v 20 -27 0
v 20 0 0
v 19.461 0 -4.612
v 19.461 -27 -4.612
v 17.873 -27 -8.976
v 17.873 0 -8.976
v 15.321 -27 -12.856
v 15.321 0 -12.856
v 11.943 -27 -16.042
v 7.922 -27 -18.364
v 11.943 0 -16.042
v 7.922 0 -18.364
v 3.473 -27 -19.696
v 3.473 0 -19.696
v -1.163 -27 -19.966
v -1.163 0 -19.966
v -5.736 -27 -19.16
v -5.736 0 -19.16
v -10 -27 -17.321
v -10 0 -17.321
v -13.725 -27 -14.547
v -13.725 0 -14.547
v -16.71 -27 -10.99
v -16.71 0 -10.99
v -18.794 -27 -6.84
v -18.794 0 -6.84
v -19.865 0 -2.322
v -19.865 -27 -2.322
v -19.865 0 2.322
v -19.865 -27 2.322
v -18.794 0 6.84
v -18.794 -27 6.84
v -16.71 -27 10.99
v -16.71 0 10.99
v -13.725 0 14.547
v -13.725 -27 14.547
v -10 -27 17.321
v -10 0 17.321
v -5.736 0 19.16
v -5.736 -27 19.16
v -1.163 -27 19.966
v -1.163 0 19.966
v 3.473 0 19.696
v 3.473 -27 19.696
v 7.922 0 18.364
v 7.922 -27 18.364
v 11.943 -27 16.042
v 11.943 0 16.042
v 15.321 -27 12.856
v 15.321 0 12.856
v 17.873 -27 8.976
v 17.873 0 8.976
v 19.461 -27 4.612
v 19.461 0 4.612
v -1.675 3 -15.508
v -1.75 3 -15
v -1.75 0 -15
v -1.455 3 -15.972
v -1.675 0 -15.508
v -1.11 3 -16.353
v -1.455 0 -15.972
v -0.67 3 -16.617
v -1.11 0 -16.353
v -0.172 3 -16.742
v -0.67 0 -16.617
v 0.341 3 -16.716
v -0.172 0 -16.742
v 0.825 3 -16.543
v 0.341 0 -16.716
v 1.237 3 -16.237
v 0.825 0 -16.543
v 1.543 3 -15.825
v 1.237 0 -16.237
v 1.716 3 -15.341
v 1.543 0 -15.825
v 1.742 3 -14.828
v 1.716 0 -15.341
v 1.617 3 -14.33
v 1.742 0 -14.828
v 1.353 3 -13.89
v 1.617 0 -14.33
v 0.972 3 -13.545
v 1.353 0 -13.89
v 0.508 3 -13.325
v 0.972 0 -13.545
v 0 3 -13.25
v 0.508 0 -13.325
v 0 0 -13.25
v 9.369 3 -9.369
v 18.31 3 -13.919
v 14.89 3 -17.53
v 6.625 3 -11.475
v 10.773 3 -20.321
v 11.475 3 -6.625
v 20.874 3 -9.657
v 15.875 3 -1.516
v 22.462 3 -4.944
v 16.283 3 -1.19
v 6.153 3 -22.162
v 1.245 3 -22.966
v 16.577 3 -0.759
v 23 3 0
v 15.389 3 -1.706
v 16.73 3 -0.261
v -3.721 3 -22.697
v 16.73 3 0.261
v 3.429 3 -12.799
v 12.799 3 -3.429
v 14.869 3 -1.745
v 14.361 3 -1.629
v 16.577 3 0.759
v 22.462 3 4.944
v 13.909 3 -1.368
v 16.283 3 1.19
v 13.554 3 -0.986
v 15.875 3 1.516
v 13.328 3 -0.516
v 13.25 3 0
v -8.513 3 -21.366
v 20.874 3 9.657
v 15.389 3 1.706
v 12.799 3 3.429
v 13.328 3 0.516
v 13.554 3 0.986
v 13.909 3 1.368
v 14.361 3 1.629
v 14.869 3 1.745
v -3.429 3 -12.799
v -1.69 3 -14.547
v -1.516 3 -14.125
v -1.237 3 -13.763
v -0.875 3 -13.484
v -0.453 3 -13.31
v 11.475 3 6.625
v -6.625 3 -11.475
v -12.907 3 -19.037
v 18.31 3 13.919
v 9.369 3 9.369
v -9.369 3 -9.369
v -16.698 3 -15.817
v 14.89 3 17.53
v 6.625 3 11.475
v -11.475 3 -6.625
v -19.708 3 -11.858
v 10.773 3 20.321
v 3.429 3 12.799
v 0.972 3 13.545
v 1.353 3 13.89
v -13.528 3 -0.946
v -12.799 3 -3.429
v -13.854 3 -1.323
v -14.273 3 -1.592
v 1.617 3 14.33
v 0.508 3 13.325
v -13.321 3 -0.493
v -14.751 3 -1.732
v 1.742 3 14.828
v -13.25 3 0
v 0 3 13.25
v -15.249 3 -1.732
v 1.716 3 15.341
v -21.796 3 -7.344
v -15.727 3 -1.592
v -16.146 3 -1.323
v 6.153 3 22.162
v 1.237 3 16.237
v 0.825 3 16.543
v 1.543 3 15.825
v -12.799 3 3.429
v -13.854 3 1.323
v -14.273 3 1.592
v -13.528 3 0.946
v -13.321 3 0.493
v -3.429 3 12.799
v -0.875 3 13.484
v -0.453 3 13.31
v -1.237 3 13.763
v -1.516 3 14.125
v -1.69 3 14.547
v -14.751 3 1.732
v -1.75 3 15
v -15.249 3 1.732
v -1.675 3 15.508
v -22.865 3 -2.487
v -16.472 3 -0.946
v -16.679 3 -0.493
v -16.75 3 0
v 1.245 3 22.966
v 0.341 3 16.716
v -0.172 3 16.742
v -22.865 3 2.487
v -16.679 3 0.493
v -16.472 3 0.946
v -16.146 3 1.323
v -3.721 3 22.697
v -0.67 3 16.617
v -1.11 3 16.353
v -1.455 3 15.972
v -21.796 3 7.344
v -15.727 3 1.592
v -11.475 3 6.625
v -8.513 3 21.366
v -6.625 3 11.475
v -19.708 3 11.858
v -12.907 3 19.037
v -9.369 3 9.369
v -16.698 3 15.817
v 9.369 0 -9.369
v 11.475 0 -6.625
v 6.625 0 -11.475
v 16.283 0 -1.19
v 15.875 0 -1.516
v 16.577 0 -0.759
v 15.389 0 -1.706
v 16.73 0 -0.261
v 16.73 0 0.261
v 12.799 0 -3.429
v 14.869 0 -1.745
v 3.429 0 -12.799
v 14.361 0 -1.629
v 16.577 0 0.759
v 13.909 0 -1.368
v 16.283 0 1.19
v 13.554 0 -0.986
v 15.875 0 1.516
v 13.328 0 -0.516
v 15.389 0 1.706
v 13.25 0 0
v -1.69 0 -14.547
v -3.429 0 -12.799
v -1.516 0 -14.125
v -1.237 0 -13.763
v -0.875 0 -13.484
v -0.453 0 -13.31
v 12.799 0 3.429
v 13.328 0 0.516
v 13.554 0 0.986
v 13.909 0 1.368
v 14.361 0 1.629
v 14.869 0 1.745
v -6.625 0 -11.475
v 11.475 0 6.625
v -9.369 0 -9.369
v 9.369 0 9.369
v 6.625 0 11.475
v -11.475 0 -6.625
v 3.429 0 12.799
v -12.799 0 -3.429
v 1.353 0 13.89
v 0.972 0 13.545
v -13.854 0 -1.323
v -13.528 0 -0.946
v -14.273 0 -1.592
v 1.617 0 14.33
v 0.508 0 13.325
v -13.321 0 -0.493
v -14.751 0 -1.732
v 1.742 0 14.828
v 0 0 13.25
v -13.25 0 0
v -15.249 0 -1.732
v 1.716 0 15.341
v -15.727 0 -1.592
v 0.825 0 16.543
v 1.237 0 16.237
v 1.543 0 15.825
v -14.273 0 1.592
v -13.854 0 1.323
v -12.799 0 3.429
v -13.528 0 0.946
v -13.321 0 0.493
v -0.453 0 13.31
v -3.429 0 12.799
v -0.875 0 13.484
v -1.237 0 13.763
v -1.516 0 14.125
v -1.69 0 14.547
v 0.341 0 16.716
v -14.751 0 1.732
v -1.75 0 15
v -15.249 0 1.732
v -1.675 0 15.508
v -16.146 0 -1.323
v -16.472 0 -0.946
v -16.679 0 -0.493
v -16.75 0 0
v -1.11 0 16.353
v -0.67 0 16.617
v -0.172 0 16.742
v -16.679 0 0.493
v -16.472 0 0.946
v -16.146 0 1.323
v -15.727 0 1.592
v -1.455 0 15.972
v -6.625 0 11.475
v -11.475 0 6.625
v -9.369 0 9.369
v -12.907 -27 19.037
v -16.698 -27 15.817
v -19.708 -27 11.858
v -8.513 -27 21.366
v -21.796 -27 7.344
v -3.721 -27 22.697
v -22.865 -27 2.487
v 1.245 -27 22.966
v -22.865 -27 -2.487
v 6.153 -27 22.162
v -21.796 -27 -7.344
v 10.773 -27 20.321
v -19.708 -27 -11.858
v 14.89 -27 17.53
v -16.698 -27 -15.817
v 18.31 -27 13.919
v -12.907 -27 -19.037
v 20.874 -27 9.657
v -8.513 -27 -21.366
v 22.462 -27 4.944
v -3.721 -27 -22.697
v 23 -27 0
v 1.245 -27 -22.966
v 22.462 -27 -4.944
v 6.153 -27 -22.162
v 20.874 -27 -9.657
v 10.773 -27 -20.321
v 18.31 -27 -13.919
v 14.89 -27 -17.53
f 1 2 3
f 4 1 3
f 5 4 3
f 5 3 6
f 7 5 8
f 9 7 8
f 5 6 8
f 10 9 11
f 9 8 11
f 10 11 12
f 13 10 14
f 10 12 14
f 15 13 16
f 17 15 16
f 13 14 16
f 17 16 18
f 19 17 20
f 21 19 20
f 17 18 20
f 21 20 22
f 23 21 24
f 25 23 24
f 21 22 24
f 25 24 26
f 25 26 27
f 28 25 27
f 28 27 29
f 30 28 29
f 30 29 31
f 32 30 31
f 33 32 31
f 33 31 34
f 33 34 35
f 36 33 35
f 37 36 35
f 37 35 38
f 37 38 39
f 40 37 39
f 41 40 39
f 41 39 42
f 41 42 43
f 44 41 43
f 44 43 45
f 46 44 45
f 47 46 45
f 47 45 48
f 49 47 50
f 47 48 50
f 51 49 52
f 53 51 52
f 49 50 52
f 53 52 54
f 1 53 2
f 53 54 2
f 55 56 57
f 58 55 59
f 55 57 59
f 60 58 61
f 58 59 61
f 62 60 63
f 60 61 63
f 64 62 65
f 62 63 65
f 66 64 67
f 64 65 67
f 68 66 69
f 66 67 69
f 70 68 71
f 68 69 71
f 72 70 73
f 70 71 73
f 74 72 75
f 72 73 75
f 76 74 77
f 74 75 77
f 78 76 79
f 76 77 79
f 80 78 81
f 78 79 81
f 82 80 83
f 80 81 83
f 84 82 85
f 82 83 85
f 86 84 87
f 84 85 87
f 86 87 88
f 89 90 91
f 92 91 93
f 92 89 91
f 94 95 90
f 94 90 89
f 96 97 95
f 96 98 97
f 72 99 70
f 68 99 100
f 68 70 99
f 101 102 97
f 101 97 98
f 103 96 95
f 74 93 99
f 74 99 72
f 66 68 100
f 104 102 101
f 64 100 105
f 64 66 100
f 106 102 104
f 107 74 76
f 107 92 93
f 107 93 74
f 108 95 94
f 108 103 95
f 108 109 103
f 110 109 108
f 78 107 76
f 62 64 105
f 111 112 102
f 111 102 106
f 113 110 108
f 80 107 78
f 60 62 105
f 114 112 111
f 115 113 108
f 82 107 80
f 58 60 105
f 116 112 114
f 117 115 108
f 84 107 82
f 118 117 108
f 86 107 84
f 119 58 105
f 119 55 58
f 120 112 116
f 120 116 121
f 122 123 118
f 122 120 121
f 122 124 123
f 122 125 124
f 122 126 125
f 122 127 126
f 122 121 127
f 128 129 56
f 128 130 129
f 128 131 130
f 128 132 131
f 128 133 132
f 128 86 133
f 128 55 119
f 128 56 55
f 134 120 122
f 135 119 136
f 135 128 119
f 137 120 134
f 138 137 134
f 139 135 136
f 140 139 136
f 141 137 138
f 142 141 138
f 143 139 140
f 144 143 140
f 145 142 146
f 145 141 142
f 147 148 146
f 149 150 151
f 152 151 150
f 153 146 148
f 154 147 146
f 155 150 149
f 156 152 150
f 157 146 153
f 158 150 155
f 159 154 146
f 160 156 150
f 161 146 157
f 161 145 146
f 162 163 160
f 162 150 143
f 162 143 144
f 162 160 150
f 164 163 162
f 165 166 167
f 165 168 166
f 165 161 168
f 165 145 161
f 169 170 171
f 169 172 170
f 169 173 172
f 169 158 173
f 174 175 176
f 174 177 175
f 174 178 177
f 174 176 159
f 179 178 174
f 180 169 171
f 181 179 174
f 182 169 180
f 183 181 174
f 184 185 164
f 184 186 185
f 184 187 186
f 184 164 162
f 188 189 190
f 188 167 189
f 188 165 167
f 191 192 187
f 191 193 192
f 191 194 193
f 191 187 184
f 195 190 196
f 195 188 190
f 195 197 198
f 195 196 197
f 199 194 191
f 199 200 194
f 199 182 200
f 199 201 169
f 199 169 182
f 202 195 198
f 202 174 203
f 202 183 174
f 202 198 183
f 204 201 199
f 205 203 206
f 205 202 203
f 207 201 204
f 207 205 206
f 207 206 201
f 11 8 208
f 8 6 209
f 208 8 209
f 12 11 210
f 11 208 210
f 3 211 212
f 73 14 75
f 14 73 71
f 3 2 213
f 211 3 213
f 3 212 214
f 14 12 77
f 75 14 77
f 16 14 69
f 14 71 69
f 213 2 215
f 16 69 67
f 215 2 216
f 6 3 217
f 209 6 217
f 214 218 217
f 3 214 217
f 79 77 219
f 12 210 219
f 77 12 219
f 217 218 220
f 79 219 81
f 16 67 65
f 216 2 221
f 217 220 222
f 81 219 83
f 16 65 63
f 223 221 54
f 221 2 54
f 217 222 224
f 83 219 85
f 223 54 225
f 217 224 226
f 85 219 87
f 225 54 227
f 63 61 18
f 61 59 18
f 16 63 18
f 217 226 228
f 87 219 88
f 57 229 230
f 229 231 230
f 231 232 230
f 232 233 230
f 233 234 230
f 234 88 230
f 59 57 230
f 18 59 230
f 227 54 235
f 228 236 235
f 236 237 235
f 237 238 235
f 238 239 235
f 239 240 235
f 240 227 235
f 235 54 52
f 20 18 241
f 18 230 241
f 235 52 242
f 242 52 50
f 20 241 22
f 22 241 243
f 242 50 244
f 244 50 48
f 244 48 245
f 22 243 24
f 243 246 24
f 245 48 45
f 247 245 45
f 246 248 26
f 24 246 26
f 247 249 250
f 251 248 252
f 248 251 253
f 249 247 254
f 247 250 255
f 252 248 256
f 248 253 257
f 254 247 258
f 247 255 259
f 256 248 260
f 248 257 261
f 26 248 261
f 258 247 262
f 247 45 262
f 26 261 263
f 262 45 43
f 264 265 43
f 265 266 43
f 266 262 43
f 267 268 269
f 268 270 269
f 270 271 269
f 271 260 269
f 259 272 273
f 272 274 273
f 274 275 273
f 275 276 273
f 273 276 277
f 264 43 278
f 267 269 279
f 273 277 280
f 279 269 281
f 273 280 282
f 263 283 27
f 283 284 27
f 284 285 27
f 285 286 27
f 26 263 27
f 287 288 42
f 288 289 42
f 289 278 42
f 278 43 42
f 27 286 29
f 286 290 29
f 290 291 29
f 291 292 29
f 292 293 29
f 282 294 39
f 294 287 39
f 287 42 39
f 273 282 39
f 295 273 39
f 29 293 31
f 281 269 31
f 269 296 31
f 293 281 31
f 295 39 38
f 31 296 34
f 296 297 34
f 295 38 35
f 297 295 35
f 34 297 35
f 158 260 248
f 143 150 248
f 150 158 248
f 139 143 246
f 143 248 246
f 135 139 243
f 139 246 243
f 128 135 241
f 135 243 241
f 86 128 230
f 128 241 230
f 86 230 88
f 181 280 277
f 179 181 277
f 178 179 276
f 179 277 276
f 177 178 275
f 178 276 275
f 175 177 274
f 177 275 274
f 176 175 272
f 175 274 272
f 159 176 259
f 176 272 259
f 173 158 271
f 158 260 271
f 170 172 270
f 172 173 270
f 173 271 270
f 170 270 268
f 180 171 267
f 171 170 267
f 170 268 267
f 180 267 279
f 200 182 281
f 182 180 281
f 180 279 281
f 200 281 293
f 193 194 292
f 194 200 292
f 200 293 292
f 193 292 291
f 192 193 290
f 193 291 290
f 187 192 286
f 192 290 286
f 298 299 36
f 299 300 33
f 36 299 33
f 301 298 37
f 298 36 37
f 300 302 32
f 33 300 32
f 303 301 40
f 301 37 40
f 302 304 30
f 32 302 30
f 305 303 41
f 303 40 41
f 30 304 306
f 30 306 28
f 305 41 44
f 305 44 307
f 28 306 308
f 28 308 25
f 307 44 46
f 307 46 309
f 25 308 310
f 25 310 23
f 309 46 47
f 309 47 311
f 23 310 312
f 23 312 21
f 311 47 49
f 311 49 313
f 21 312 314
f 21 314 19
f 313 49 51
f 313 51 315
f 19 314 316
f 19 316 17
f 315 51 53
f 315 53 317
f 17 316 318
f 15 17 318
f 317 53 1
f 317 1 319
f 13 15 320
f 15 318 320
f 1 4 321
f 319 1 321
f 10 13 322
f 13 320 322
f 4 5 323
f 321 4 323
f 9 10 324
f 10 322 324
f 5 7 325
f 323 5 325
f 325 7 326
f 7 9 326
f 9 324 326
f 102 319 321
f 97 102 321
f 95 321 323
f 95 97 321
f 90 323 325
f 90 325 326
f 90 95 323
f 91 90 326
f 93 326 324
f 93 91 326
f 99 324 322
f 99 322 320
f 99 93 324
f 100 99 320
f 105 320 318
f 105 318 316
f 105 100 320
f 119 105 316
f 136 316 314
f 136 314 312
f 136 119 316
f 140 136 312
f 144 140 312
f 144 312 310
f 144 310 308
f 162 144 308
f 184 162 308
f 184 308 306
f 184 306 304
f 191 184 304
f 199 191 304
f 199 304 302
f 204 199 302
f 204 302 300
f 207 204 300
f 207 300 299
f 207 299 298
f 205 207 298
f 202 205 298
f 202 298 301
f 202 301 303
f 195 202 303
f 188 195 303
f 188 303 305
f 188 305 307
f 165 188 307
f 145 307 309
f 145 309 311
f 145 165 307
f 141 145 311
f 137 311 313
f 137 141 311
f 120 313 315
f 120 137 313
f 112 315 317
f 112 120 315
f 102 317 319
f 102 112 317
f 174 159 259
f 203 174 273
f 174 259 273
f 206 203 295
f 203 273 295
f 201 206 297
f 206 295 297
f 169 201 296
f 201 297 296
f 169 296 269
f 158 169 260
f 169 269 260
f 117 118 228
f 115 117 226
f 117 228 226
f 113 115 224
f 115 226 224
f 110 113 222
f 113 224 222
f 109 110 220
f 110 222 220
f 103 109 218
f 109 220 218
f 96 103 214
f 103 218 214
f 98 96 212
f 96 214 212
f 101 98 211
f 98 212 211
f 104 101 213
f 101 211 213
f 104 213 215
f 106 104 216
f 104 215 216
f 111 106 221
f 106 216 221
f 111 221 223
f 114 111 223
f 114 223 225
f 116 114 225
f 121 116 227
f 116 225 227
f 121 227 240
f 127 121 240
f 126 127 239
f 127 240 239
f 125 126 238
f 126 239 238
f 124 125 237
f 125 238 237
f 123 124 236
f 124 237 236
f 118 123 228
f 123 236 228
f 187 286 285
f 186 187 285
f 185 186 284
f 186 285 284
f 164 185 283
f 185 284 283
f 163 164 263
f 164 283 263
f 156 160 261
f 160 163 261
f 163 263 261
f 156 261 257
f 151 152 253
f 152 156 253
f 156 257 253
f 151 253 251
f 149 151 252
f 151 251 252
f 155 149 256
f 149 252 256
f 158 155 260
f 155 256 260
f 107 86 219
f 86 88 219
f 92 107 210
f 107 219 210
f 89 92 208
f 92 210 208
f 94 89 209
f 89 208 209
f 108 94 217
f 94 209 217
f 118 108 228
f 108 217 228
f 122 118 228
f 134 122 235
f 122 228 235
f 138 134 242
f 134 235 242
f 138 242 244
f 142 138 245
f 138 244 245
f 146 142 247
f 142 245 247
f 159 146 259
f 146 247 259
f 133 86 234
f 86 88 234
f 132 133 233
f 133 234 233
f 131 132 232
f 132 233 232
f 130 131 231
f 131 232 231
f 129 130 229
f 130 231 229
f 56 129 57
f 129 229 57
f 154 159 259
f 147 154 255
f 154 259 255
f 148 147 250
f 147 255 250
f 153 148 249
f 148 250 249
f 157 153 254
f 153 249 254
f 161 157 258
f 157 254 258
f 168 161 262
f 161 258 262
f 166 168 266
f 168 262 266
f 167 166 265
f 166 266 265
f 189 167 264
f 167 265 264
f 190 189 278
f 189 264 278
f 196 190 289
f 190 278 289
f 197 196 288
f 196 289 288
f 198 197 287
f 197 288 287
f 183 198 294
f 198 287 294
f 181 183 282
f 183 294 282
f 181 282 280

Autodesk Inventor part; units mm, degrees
ref_plane "YZ Plane" through (0, 0, 0) normal (1, 0, 0) x (0, 1, 0)
ref_plane "XZ Plane" through (0, 0, 0) normal (0, 1, 0) x (-1, 0, 0)
ref_plane "XY Plane" through (0, 0, 0) normal (0, 0, 1) x (1, 0, 0)
sketch "Sketch1" plane through (0, 0, 0) normal (0, 1, 0) x (-1, 0, 0)
  circle A0 centre (0, 0) radius 20
  circle A1 centre (0, 0) radius 15 construction
  circle A2 centre (0, -15) radius 1.75
  circle A3 centre (-15, 0) radius 1.75
  circle A4 centre (0, 15) radius 1.75
  circle A5 centre (15, 0) radius 1.75
  circle A6 centre (0, 0) radius 13.25
  point P0 (0, -13.25)
  point P1 (-13.25, 0)
  point P2 (0, 13.25)
  point P3 (13.25, 0)
  dimension "d0" = 40
  dimension "d1" = 30
  dimension "d2" = 3.5
  dimension "d3" = 3.5
  dimension "d4" = 3.5
  dimension "d5" = 3.5
extrude "Extrusion1" add sketch "Sketch1" along normal blind 3
sketch "Sketch2" plane through (0, 3, 0) normal (0, 1, 0) x (1, 0, 0)
  circle A0 centre (0, 0) radius 20
  circle A1 centre (0, 0) radius 23
  dimension "d8" = 46
extrude "Extrusion2" add sketch "Sketch2" against normal blind 30
properties part number "ColourSensor Scope"
